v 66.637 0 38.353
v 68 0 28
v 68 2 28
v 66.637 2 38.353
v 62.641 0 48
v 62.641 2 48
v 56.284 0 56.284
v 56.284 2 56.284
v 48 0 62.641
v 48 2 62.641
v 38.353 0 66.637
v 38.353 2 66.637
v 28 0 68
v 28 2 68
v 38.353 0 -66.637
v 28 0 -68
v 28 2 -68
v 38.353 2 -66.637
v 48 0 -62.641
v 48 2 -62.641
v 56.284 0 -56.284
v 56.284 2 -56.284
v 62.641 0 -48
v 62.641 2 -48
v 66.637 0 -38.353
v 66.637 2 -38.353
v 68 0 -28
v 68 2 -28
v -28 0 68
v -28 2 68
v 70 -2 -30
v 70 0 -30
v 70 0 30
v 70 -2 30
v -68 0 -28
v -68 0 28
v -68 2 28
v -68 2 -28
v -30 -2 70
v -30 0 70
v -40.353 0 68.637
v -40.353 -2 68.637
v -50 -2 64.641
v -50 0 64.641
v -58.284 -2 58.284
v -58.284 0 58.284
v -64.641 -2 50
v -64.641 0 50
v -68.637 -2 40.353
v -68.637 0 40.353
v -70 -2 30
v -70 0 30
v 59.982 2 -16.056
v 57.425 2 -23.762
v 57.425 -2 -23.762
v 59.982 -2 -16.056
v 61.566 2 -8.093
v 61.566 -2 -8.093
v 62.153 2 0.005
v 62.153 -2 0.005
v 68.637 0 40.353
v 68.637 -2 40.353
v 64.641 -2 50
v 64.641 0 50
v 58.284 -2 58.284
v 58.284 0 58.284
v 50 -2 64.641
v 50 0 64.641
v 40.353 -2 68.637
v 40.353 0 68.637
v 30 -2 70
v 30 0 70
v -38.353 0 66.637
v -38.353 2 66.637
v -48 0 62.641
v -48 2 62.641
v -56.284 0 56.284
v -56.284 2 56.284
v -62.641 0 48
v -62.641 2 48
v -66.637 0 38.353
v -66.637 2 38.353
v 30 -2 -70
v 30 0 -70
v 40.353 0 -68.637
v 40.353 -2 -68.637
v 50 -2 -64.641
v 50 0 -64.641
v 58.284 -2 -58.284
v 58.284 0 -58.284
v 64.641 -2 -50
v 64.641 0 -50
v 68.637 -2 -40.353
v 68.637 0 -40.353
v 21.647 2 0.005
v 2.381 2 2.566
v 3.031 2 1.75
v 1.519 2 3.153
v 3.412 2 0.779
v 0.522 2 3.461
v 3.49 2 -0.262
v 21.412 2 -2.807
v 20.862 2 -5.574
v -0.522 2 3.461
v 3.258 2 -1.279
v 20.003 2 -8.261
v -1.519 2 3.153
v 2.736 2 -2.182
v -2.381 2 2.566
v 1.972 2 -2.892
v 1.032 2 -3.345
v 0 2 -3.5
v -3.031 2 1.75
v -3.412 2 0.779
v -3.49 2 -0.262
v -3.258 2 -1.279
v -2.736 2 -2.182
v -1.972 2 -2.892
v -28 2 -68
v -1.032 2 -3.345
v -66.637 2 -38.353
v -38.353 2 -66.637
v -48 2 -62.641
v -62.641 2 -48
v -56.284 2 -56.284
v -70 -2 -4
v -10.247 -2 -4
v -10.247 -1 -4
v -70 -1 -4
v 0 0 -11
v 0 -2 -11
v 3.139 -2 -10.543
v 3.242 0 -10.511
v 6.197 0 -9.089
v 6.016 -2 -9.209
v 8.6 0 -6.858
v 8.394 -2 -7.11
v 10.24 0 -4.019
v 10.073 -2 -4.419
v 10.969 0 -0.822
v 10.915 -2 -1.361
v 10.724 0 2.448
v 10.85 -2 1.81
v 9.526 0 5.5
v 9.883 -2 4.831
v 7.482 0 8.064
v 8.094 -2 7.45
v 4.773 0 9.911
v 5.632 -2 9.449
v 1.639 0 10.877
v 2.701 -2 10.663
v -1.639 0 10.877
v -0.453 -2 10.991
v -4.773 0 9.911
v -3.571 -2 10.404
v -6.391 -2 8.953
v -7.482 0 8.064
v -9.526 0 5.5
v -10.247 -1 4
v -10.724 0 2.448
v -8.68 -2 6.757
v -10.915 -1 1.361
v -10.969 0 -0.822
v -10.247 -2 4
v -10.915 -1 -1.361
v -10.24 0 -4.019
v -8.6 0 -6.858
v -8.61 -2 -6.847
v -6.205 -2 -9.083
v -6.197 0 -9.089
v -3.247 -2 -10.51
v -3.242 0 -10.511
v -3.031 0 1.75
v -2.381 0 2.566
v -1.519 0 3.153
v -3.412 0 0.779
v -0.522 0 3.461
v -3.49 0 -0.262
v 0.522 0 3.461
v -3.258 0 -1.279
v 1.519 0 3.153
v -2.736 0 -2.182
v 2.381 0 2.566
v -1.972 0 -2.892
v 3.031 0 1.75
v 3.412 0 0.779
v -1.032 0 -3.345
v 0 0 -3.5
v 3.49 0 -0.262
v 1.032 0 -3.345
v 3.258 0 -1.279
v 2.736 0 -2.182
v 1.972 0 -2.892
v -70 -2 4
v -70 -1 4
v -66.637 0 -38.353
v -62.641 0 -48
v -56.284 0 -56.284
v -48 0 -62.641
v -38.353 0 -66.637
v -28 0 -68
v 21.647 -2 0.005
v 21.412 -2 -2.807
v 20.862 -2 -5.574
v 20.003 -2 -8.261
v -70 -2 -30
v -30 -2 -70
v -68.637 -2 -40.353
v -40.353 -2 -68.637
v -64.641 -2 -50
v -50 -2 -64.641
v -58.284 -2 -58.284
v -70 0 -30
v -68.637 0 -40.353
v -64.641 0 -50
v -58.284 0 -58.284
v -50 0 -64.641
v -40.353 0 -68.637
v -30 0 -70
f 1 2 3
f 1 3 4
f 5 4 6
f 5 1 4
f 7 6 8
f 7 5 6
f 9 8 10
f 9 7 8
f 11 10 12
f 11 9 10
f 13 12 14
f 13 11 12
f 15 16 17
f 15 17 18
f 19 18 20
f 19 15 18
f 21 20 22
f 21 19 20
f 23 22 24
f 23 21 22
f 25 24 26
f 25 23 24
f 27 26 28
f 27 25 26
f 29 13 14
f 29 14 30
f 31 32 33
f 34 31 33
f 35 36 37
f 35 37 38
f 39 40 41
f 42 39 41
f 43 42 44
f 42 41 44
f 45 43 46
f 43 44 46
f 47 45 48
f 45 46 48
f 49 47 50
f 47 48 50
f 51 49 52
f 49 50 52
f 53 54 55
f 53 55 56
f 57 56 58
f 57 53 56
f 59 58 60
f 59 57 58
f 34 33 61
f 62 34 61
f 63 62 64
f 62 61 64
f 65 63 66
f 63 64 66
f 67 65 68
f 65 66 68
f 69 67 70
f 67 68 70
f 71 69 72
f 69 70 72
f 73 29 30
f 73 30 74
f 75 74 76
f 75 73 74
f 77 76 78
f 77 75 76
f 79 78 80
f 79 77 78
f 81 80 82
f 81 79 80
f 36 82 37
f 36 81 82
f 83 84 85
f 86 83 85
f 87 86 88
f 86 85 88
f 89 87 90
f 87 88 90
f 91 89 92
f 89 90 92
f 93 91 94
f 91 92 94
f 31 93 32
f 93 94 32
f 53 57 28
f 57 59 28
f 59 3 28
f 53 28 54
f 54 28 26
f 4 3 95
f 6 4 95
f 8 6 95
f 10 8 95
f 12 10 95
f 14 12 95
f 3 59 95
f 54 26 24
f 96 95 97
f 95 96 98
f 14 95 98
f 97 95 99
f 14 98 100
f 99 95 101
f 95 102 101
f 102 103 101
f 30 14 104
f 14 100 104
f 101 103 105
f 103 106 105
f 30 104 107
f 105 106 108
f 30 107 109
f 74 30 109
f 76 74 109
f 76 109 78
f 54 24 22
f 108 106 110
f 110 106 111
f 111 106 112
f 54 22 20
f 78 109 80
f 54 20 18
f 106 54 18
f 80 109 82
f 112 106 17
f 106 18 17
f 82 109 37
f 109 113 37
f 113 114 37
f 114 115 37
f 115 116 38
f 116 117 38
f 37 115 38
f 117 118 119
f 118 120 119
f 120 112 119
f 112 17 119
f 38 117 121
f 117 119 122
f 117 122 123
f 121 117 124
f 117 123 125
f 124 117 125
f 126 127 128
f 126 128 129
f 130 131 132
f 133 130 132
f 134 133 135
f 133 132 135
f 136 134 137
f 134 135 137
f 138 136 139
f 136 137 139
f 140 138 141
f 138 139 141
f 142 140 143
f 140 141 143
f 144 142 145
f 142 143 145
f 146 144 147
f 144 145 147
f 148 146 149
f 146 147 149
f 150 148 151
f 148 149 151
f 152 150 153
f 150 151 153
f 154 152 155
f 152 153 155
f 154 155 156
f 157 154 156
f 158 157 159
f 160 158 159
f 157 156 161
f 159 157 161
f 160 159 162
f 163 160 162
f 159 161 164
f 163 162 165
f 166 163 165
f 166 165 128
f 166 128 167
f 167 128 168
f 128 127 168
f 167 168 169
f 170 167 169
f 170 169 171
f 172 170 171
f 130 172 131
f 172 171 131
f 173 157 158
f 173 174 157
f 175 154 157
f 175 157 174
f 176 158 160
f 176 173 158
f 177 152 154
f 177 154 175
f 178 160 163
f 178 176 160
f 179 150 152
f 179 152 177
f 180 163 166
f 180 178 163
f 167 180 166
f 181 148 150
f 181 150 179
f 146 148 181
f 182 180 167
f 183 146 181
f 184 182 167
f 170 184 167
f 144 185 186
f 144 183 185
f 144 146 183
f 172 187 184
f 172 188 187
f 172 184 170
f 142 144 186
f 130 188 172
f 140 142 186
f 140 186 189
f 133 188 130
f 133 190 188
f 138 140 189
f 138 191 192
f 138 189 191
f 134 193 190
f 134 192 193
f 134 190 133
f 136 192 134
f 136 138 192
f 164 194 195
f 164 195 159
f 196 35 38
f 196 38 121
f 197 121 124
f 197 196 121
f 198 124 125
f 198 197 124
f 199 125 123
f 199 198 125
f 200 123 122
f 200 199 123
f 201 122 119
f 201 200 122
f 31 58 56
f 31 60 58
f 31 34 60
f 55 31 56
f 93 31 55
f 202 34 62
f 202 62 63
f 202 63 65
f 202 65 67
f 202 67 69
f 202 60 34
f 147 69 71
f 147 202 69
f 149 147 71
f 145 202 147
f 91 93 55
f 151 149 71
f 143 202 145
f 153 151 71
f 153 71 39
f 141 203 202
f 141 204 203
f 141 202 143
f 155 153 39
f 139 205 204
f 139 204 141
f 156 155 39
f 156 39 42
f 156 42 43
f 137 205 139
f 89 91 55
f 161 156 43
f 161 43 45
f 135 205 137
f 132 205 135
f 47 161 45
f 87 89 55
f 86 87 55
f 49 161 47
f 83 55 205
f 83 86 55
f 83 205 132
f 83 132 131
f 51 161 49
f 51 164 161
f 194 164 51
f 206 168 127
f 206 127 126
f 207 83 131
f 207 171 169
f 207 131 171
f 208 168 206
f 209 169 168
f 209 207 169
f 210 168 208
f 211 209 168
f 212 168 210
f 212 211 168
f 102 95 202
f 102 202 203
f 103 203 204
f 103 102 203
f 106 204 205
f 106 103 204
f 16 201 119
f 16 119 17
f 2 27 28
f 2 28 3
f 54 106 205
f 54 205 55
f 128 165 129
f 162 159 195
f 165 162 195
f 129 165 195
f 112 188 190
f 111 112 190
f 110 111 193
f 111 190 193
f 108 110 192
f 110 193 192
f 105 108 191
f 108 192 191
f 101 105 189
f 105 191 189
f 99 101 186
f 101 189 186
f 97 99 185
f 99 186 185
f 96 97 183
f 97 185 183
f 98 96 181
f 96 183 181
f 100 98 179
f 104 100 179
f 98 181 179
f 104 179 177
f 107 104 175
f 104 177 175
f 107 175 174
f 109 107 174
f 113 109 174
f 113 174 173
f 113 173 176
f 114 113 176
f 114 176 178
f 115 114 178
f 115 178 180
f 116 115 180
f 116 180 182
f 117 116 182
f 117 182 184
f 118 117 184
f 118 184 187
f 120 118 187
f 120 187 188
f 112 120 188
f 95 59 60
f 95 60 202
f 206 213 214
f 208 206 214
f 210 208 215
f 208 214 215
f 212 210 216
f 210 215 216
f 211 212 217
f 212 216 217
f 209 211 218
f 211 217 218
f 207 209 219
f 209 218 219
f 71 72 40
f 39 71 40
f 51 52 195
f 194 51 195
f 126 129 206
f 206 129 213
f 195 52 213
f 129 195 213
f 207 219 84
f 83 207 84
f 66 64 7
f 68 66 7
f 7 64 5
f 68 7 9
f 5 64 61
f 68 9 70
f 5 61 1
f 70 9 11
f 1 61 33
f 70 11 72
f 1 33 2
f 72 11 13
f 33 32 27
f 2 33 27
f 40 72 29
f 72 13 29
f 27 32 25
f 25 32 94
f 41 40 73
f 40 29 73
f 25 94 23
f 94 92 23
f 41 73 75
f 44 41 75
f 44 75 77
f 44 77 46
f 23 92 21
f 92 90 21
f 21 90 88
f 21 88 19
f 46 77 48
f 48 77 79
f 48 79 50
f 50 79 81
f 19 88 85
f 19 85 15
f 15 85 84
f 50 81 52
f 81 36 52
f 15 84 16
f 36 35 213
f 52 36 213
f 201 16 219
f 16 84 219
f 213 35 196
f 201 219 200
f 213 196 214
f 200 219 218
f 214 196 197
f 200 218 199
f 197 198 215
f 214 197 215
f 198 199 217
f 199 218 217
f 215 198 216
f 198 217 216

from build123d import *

# Parameters (mm, degrees)
BOSS_EXTRUDE5_DEPTH     = 2
BOSS_EXTRUDE6_DEPTH     = 2
SKETCH6_R               = 11
CUT_EXTRUDE1_DEPTH      = 2
CUT_EXTRUDE3_DEPTH      = 24
CUT_EXTRUDE3_DEPTH_BACK = 35
SKETCH7_R               = 2.603714659
SKETCH8_R               = 1.4
BOSS_EXTRUDE8_DEPTH     = 4
CUT_EXTRUDE8_DEPTH      = 4
CUT_EXTRUDE9_START      = -2
SKETCH17_R              = 1.4
CUT_EXTRUDE9_DEPTH      = 2
CUT_EXTRUDE10_DEPTH     = 1
SKETCH19_R              = 3.5
CUT_EXTRUDE11_DEPTH     = 10


with BuildPart() as part:
    # Sketch1 → Boss-Extrude5 (new body)
    with BuildSketch(Plane(origin=(0, 0, 0), x_dir=(1, 0, 0), z_dir=(0, 1, 0))):
        with BuildLine():
            Line((-30, 70), (30, 70))
            ThreePointArc((30, 70), (58.284271247, 58.284271247), (70, 30))
            Line((70, 30), (70, -30))
            ThreePointArc((70, -30), (58.284271247, -58.284271247), (30, -70))
            Line((30, -70), (-30, -70))
            ThreePointArc((-30, -70), (-58.284271247, -58.284271247), (-70, -30))
            Line((-70, -30), (-70, 30))
            ThreePointArc((-70, 30), (-58.284271247, 58.284271247), (-30, 70))
        make_face()
    extrude(amount=-BOSS_EXTRUDE5_DEPTH)

    # Sketch5 → Boss-Extrude6 (add)
    with BuildSketch(Plane(origin=(0, 0, 0), x_dir=(1, 0, 0), z_dir=(0, 1, 0))):
        with BuildLine():
            Line((-28, 68), (28, 68))
            ThreePointArc((28, 68), (56.284271247, 56.284271247), (68, 28))
            Line((68, 28), (68, -28))
            ThreePointArc((68, -28), (56.284271247, -56.284271247), (28, -68))
            Line((28, -68), (-28, -68))
            ThreePointArc((-28, -68), (-56.284271247, -56.284271247), (-68, -28))
            Line((-68, -28), (-68, 28))
            ThreePointArc((-68, 28), (-56.284271247, 56.284271247), (-28, 68))
        make_face()
    extrude(amount=BOSS_EXTRUDE6_DEPTH)

    # Sketch6 → Cut-Extrude1 (cut)
    with BuildSketch(Plane.XZ.offset(2)):
        with Locations(Location((0, 0, 0), (0, 0, 270))):
            Circle(SKETCH6_R)
    extrude(amount=-CUT_EXTRUDE1_DEPTH, mode=Mode.SUBTRACT)

    # Sketch7 → Cut-Extrude3 (cut, two sides: drawn at the far end of the back side and taken through both)
    with BuildSketch(Plane.XZ.offset(-CUT_EXTRUDE3_DEPTH_BACK)):
        with Locations(Location((0, 0, 0), (0, 0, 90))):
            Circle(SKETCH7_R)
    extrude(amount=CUT_EXTRUDE3_DEPTH + CUT_EXTRUDE3_DEPTH_BACK, mode=Mode.SUBTRACT)

    # Sketch8 → Boss-Extrude8 (add)
    with BuildSketch(Plane(origin=(0, 0, 0), x_dir=(1, 0, 0), z_dir=(0, 1, 0))):
        with Locations(Location((13, 13, 0), (0, 0, 270))):
            Circle(SKETCH8_R)
        with Locations(Location((13, -13, 0), (0, 0, 270))):
            Circle(SKETCH8_R)
        with Locations(Location((-13, -13, 0), (0, 0, 270))):
            Circle(SKETCH8_R)
        with Locations(Location((-13, 13, 0), (0, 0, 270))):
            Circle(SKETCH8_R)
    extrude(amount=-BOSS_EXTRUDE8_DEPTH)

    # Sketch15 → Cut-Extrude8 (cut)
    with BuildSketch(Plane(origin=(0, 2, 0), x_dir=(1, 0, 0), z_dir=(0, 1, 0))):
        with BuildLine():
            Line((20.002895237, 8.260924079), (57.425217049, 23.761757309))
            ThreePointArc((57.425217049, 23.761757309), (60.897596895, 12.098982138), (62.152687059, -0.004839374))
            Line((62.152687059, -0.004839374), (21.647057814, -0.004839374))
            ThreePointArc((21.647057814, -0.004839374), (21.175793038, 4.197824096), (20.002895237, 8.260924079))
        make_face()
    extrude(amount=-CUT_EXTRUDE8_DEPTH, mode=Mode.SUBTRACT)

    # Sketch17 → Cut-Extrude9 (cut)
    with BuildSketch(Plane.XZ.offset(4).offset(CUT_EXTRUDE9_START)):
        with Locations((13, 13)):
            Circle(SKETCH17_R)
        with Locations((13, -13)):
            Circle(SKETCH17_R)
        with Locations((-13, -13)):
            Circle(SKETCH17_R)
        with Locations((-13, 13)):
            Circle(SKETCH17_R)
    extrude(amount=CUT_EXTRUDE9_DEPTH, mode=Mode.SUBTRACT)

    # Sketch18 → Cut-Extrude10 (cut)
    with BuildSketch(Plane.XZ.offset(2)):
        with BuildLine():
            Line((-70, 0), (-70, 4))
            Line((-70, 4), (-10.246950766, 4))
            ThreePointArc((-10.246950766, 4), (-11, 0), (-10.246950766, -4))
            Line((-10.246950766, -4), (-70, -4))
            Line((-70, -4), (-70, 0))
        make_face()
    extrude(amount=-CUT_EXTRUDE10_DEPTH, mode=Mode.SUBTRACT)

    # Sketch19 → Cut-Extrude11 (cut)
    with BuildSketch(Plane.XZ):
        with Locations(Location((0, 0, 0), (0, 0, 270))):
            Circle(SKETCH19_R)
    extrude(amount=-CUT_EXTRUDE11_DEPTH, mode=Mode.SUBTRACT)


solid = part.part
